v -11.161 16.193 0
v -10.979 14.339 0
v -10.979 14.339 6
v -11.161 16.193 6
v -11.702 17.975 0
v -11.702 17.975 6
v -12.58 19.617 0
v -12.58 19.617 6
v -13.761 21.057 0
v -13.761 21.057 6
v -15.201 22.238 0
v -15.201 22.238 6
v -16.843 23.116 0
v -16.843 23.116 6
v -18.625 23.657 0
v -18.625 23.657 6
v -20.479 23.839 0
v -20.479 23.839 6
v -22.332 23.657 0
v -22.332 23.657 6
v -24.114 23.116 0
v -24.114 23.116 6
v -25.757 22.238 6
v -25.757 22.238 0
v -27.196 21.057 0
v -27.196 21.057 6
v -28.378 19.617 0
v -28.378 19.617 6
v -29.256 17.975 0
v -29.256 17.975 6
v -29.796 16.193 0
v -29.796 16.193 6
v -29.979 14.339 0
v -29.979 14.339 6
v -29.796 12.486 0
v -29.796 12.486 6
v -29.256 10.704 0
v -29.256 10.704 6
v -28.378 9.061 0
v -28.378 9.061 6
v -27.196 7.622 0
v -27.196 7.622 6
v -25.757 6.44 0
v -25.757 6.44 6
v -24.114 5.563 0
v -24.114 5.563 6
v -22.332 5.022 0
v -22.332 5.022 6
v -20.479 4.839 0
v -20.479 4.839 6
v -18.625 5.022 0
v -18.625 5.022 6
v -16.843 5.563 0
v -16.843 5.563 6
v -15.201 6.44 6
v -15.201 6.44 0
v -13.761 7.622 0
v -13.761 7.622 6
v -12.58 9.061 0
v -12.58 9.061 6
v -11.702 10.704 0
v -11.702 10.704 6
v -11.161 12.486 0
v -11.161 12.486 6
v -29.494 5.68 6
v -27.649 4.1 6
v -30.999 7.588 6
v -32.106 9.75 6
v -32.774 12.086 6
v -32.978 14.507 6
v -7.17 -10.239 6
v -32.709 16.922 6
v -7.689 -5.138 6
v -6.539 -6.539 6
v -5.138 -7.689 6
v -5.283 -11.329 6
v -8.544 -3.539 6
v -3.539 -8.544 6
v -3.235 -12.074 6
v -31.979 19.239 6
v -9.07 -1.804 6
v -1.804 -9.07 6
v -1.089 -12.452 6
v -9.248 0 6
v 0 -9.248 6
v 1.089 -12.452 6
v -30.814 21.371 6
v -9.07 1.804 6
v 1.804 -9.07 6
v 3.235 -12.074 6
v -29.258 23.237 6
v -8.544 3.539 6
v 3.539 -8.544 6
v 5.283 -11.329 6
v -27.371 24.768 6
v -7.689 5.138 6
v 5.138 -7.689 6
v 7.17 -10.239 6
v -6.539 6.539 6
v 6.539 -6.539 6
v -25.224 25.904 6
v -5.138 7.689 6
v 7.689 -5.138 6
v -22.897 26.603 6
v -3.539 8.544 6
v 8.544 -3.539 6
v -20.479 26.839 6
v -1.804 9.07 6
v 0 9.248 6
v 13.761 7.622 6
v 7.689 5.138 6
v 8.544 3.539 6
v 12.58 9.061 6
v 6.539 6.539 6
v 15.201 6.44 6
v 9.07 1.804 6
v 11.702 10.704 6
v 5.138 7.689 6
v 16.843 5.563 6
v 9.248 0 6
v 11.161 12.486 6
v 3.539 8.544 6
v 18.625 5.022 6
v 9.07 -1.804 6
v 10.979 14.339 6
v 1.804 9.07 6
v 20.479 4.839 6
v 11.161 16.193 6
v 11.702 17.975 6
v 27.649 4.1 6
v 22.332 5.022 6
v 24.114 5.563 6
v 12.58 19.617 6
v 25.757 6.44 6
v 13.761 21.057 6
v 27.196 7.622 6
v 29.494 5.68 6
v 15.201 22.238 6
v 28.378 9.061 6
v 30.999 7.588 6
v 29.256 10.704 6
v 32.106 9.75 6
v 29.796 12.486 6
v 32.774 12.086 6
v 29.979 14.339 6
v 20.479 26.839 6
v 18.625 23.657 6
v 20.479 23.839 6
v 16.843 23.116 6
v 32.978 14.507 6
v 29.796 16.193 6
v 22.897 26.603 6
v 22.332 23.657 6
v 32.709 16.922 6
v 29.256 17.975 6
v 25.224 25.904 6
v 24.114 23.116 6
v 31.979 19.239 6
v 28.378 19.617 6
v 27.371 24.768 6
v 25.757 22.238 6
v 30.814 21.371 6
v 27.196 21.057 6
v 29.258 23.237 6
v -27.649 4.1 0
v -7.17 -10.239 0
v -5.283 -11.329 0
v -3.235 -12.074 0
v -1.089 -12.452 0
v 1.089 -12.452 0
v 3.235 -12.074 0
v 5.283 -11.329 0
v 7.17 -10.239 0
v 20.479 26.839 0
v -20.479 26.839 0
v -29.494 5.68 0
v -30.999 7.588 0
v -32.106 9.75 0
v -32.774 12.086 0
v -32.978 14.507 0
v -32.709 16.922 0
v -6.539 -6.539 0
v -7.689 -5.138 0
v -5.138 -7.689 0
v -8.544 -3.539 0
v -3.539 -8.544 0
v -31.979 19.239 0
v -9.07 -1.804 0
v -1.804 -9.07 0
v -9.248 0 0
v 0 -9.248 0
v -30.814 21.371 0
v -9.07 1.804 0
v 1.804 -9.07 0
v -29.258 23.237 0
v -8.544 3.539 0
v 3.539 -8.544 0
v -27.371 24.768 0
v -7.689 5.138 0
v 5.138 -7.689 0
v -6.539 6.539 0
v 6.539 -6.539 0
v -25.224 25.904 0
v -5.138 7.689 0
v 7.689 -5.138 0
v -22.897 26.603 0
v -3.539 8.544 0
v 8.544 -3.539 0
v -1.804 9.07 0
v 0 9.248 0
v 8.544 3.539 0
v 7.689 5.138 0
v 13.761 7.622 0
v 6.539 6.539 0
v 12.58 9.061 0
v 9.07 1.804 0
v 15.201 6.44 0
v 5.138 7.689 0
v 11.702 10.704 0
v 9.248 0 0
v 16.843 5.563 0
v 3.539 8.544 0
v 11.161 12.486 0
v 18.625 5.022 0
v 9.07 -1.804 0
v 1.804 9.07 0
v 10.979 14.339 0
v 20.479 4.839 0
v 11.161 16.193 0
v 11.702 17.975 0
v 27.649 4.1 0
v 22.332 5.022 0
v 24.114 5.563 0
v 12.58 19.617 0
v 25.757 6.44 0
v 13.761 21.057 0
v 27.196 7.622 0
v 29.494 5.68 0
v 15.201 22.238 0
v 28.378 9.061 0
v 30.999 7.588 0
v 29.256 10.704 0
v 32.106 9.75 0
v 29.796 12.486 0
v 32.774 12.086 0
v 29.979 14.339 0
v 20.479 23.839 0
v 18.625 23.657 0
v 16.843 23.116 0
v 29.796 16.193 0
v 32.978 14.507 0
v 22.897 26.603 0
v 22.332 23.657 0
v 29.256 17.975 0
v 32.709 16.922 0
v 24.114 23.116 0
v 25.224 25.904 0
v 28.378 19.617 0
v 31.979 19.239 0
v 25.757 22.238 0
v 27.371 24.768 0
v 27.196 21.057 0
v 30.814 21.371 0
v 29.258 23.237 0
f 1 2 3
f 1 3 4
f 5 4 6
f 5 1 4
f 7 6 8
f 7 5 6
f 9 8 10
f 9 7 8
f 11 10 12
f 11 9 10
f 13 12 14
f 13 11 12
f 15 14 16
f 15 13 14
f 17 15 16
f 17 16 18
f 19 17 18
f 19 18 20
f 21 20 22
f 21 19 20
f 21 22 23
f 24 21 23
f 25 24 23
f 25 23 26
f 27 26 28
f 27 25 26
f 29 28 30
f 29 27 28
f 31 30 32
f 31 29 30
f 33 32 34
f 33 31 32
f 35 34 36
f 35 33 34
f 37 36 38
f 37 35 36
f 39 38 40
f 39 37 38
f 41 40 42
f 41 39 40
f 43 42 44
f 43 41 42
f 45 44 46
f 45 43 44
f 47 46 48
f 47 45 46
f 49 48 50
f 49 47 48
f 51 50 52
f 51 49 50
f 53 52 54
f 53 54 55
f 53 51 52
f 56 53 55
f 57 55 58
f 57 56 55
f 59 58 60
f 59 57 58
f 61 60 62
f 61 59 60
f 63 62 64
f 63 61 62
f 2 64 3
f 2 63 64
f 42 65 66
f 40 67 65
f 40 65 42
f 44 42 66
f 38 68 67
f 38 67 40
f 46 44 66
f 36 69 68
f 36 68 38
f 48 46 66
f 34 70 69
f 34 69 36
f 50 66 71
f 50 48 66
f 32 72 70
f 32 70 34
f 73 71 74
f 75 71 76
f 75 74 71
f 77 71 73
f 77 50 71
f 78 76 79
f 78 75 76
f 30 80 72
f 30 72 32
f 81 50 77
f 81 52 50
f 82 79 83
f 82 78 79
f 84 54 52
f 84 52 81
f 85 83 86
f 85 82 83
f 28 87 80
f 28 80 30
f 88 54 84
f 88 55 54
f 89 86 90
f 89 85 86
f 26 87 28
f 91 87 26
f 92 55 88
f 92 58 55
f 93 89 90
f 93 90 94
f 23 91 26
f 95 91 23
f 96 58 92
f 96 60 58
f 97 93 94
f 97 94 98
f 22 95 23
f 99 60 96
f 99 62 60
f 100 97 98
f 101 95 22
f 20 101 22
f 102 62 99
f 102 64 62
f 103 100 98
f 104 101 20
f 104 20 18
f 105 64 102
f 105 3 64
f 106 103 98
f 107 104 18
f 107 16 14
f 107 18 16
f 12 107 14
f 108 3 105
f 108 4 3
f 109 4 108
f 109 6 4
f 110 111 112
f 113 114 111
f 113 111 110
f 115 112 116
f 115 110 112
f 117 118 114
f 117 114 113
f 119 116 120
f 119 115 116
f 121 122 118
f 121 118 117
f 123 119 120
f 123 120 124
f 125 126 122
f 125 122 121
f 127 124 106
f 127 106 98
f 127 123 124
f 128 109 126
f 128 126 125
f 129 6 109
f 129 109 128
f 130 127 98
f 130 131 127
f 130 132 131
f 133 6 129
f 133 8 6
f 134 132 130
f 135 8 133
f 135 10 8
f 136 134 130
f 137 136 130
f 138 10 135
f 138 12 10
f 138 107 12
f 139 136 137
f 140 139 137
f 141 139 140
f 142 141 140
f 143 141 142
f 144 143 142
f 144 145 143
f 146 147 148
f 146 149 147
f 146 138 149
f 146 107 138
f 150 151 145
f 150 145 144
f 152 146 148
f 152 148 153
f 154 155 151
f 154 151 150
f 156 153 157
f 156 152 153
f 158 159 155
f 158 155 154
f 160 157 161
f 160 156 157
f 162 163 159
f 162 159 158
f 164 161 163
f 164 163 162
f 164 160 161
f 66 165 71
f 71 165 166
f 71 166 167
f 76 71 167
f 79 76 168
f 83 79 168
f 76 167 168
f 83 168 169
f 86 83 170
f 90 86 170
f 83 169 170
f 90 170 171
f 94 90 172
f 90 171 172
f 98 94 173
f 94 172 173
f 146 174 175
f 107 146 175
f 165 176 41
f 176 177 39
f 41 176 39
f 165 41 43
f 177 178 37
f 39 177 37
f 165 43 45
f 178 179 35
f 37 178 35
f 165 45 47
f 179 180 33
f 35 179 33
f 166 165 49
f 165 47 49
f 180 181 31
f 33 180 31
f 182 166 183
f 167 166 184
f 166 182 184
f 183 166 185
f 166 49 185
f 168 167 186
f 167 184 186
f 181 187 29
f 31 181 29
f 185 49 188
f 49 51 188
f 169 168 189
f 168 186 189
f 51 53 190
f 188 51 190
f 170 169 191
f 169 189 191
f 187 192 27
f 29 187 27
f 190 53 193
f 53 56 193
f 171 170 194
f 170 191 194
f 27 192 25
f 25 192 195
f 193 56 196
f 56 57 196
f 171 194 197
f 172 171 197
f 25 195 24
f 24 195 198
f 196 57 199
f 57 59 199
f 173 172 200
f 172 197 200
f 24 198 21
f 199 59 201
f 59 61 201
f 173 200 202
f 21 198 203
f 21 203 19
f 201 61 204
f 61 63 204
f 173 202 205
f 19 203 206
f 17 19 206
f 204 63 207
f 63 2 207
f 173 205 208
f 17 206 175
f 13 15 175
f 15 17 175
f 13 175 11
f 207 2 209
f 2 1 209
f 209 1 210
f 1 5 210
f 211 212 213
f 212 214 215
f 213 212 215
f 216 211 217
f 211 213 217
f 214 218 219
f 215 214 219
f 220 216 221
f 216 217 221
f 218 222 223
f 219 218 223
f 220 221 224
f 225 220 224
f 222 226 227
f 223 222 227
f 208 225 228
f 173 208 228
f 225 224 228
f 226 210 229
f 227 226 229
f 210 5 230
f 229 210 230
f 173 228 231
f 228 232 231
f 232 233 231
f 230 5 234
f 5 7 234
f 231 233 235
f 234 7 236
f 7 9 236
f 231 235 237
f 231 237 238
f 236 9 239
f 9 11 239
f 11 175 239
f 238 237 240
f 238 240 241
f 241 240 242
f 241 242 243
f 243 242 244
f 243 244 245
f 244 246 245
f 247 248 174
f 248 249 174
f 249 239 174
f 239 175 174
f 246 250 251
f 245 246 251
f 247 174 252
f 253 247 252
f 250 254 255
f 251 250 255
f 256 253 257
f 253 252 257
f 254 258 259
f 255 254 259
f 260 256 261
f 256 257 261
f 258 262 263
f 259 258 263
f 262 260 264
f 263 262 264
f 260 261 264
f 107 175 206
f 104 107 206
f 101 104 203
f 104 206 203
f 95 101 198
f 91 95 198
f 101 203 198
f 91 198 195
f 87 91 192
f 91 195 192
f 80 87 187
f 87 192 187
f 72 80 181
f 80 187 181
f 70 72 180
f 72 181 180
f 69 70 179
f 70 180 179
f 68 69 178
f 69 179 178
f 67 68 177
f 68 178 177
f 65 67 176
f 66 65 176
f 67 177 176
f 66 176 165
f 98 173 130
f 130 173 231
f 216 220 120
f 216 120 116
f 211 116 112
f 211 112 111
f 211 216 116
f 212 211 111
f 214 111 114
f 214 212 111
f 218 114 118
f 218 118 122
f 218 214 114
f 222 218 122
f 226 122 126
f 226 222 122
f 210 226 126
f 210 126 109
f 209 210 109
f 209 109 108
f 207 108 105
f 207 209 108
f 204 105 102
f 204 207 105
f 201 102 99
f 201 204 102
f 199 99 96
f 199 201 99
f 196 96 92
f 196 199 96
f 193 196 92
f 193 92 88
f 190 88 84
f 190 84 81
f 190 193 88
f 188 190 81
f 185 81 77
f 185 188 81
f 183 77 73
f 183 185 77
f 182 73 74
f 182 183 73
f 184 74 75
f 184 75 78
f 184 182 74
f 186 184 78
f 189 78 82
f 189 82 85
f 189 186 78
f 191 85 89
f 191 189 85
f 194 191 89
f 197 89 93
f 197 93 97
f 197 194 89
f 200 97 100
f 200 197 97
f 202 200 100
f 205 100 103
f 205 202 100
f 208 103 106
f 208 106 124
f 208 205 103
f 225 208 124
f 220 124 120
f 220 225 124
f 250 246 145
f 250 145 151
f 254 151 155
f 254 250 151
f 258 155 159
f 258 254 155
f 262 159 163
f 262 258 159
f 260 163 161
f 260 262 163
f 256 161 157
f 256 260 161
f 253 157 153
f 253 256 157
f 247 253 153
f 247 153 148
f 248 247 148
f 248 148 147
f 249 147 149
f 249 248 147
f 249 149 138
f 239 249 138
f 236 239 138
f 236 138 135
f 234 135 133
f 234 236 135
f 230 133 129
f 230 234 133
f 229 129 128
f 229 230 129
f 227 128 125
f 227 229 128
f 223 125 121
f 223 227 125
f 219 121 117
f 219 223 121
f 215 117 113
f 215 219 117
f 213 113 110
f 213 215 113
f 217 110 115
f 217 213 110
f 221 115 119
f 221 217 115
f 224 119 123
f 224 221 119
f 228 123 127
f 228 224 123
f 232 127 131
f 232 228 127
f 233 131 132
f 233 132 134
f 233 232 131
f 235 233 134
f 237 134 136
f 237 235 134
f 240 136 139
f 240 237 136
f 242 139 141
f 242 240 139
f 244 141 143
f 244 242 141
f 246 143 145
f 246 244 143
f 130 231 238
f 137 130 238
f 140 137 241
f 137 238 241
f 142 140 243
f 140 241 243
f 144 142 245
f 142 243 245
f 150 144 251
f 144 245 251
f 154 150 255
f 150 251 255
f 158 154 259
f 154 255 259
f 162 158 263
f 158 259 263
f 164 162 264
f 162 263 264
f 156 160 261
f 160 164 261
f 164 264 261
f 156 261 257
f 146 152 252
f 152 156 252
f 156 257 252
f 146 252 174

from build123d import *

# Parameters (mm, degrees)
CROQUIS1_R              = 12.5
CROQUIS1_R_2            = 9.247768435
CROQUIS1_R_3            = 9.5
SALIENTE_EXTRUIR1_DEPTH = 6


with BuildPart() as part:
    # Croquis1 → Saliente-Extruir1 (new body)
    # profile 1 of 6: a face of its own
    with BuildSketch(Plane.XY):
        with BuildLine():
            Line((20.478801107, 26.839410909), (-20.478801107, 26.839410909))
            ThreePointArc((-20.478801107, 26.839410909), (-11.639966342, 23.178245674), (-7.978801107, 14.339410909))
            ThreePointArc((-7.978801107, 14.339410909), (-8.557339261, 10.580588295), (-10.239400698, 7.169705249))
            ThreePointArc((-10.239400698, 7.169705249), (-6.8e-08, 12.5), (10.239400619, 7.169705361))
            ThreePointArc((10.239400619, 7.169705361), (9.391165666, 20.111268523), (20.478801107, 26.839410909))
        make_face()
    # profile 2 of 6: a face of its own
    with BuildSketch(Plane.XY):
        with BuildLine():
            ThreePointArc((-10.239400698, 7.169705249), (-18.30819901, 2.029313974), (-27.648506562, 4.100010355))
            Line((-27.648506562, 4.100010355), (-7.169705454, -10.239400554))
            ThreePointArc((-7.169705454, -10.239400554), (-12.310096891, -2.170602344), (-10.239400698, 7.169705249))
        make_face()
    # profile 3 of 6: a face of its own
    with BuildSketch(Plane.XY):
        with BuildLine():
            ThreePointArc((27.648506562, 4.100010355), (18.308198943, 2.029313986), (10.239400619, 7.169705361))
            ThreePointArc((10.239400619, 7.169705361), (11.921461902, 3.758822439), (12.5, 0))
            ThreePointArc((12.5, 0), (11.087635415, -5.771857665), (7.169705454, -10.239400554))
            Line((7.169705454, -10.239400554), (27.648506562, 4.100010355))
        make_face()
    # profile 4 of 6: a face of its own
    with BuildSketch(Plane.XY):
        Circle(CROQUIS1_R)
        Circle(CROQUIS1_R_2, mode=Mode.SUBTRACT)
    # profile 5 of 6: a face of its own
    with BuildSketch(Plane.XY):
        with Locations((-20.478801107, 14.339410909)):
            Circle(CROQUIS1_R)
        with Locations((-20.478801107, 14.339410909)):
            Circle(CROQUIS1_R_3, mode=Mode.SUBTRACT)
    # profile 6 of 6: a face of its own
    with BuildSketch(Plane.XY):
        with Locations((20.478801107, 14.339410909)):
            Circle(CROQUIS1_R)
        with Locations((20.478801107, 14.339410909)):
            Circle(CROQUIS1_R_3, mode=Mode.SUBTRACT)
    extrude(amount=SALIENTE_EXTRUIR1_DEPTH)


solid = part.part
